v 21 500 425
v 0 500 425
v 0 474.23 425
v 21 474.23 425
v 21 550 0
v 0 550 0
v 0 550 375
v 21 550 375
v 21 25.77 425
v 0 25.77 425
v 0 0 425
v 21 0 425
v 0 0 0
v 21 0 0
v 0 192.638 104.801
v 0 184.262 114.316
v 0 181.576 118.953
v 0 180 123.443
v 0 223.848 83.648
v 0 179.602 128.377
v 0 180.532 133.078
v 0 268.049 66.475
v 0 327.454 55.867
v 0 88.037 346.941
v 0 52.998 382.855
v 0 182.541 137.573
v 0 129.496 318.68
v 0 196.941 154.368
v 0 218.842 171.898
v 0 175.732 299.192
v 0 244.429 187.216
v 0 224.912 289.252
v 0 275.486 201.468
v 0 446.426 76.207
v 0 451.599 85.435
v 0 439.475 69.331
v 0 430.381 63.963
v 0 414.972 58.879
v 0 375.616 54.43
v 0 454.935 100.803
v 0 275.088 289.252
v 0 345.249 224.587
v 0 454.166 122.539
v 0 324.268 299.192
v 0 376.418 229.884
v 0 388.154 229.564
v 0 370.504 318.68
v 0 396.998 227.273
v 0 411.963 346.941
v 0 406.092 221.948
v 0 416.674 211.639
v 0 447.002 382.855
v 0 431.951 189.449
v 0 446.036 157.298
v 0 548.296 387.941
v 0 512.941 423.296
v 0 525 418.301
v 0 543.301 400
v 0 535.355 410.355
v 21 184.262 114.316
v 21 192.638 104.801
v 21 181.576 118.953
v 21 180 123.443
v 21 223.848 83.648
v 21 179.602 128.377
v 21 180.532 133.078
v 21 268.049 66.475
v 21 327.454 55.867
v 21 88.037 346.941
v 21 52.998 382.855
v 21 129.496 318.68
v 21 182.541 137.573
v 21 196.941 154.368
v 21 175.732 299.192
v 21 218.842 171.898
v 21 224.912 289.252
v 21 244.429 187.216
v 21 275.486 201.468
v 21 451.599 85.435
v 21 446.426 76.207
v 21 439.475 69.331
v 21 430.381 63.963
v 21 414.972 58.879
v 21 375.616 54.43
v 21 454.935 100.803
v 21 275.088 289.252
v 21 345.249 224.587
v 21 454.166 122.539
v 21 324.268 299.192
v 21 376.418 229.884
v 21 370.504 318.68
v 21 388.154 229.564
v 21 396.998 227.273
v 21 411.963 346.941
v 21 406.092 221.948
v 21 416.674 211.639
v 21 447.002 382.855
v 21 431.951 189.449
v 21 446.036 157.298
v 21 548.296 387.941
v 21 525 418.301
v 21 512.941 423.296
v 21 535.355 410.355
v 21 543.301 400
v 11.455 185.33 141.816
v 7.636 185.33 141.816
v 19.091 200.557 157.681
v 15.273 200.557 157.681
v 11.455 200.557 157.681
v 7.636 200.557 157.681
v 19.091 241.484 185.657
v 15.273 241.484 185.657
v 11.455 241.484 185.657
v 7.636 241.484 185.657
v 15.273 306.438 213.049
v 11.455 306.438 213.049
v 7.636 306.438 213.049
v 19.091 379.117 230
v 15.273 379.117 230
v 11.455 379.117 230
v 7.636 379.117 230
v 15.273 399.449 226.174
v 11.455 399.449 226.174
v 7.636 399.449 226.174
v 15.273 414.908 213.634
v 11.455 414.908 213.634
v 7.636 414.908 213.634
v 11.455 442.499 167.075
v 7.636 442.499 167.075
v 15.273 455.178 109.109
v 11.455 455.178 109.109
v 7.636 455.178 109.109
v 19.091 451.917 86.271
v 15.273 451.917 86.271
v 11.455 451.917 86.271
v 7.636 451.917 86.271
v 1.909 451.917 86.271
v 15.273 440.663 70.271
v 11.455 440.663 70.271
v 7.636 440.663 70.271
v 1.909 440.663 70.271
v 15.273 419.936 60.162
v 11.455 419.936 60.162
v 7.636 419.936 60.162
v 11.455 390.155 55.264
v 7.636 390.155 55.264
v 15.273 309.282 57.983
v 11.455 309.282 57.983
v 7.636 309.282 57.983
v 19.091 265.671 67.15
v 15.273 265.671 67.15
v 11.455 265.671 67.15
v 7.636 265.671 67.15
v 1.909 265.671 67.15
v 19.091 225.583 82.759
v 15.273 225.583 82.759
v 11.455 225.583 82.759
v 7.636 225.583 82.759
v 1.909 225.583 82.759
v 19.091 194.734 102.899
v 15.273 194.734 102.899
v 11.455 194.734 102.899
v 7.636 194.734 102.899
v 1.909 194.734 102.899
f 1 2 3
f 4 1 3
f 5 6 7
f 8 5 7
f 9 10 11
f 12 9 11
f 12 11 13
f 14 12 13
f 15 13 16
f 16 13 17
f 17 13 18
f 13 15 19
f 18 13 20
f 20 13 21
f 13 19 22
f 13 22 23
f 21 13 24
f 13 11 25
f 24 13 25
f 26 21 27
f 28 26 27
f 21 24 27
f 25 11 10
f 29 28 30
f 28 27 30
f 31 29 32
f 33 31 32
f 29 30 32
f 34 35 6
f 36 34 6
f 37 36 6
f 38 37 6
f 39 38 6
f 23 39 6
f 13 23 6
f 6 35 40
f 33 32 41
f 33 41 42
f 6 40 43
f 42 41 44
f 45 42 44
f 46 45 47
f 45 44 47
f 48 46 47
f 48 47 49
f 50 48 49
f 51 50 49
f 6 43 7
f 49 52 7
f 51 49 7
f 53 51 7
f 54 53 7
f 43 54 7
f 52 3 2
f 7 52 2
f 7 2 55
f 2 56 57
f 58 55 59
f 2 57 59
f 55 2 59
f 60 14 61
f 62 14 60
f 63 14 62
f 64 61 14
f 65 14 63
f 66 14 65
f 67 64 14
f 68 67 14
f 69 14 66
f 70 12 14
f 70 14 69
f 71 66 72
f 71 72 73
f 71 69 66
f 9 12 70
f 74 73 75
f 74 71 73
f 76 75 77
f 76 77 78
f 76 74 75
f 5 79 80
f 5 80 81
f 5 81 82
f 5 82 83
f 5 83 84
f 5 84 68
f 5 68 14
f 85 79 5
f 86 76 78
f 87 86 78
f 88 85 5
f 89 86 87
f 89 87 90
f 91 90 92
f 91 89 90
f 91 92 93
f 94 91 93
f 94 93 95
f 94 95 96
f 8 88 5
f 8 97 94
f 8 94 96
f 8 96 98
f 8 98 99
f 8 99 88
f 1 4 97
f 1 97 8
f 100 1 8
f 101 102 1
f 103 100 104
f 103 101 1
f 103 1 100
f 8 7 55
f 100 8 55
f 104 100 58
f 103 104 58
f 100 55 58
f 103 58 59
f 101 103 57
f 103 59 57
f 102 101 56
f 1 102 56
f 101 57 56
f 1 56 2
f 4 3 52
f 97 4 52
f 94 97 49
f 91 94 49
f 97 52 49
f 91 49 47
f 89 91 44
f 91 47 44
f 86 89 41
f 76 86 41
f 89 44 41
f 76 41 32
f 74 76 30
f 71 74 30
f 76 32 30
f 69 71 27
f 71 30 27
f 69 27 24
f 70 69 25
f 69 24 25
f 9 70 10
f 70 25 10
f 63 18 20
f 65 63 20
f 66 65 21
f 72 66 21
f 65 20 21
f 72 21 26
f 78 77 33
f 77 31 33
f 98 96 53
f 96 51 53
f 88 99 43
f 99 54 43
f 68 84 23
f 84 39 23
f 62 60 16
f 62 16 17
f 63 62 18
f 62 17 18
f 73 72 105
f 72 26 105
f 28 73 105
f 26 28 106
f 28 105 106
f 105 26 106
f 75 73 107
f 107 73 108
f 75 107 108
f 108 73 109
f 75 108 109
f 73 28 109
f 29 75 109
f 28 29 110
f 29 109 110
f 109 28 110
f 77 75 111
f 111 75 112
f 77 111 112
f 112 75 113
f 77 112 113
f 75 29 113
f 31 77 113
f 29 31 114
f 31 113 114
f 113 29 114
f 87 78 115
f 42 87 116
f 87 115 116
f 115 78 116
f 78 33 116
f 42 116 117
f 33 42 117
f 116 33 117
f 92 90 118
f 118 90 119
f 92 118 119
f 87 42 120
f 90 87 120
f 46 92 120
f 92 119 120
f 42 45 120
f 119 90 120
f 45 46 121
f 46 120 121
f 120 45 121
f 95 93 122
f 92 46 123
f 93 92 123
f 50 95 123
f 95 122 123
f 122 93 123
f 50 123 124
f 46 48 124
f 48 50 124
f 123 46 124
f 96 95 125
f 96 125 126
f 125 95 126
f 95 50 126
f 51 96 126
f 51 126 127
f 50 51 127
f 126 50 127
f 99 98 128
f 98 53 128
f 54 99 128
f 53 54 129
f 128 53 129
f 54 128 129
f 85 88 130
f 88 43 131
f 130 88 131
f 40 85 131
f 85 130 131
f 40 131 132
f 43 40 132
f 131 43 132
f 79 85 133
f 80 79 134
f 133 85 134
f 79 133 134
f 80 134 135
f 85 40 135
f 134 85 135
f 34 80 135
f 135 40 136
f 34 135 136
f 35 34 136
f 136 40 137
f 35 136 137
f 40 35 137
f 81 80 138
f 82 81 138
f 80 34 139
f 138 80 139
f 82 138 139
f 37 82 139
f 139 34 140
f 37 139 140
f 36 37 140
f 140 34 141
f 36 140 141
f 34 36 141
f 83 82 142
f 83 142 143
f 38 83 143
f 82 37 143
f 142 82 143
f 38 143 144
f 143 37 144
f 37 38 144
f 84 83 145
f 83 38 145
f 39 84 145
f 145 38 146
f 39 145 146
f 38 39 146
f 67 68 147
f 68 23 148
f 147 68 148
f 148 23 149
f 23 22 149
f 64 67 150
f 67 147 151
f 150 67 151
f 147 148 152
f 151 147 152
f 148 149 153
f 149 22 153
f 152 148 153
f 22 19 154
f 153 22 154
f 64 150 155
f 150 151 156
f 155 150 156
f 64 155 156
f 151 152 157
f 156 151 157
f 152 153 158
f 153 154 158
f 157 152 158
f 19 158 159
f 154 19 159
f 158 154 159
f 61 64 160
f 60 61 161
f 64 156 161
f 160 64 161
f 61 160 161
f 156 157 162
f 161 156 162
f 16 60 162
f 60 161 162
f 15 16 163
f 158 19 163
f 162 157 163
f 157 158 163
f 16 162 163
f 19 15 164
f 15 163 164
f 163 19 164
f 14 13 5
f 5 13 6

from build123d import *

# Parameters (mm, degrees)
F1_DEPTH = 21


with BuildPart() as f1:
    # F0 (on Right) → F1 (new body)
    with BuildSketch(Plane.YZ):
        with BuildLine():
            Line((0, 425), (0, 0))
            Line((0, 0), (550, 0))
            Line((550, 0), (550, 375))
            ThreePointArc((550, 375), (535.3553390593, 410.3553390593), (500, 425))
            Line((500, 425), (474.2297928465, 425))
            ThreePointArc((474.2297928465, 425), (250, 288), (25.7702071535, 425))
            Line((25.7702071535, 425), (0, 425))
        make_face()
        with BuildLine():
            add(Edge.make_bspline(
                [(180, 123.443134129), (177.8570129588, 132.9249565411), (191.3015483119, 150.6721591343), (222.0560359134, 175.9929332866), (275.5914769823, 204.3997914749), (378.4716453687, 237.1509307337), (412.0932365489, 221.578916876), (444.8749073751, 172.9634837058), (460.599283361, 102.6547436059), (443.680660944, 64.3912488575), (382.5287830953, 49.9135215033), (250.9662879556, 59.0679503493), (183.7734362432, 106.7472551275), (180, 123.443134129)],
                knots=[0, 0, 0, 0, 0.0611061217, 0.1335812263, 0.2271429983, 0.3463497568, 0.4128250979, 0.5004927602, 0.5989807712, 0.6674731924, 0.7548101575, 0.8924024971, 1, 1, 1, 1], degree=3))
        make_face(mode=Mode.SUBTRACT)
    extrude(amount=F1_DEPTH)


solid = f1.part
